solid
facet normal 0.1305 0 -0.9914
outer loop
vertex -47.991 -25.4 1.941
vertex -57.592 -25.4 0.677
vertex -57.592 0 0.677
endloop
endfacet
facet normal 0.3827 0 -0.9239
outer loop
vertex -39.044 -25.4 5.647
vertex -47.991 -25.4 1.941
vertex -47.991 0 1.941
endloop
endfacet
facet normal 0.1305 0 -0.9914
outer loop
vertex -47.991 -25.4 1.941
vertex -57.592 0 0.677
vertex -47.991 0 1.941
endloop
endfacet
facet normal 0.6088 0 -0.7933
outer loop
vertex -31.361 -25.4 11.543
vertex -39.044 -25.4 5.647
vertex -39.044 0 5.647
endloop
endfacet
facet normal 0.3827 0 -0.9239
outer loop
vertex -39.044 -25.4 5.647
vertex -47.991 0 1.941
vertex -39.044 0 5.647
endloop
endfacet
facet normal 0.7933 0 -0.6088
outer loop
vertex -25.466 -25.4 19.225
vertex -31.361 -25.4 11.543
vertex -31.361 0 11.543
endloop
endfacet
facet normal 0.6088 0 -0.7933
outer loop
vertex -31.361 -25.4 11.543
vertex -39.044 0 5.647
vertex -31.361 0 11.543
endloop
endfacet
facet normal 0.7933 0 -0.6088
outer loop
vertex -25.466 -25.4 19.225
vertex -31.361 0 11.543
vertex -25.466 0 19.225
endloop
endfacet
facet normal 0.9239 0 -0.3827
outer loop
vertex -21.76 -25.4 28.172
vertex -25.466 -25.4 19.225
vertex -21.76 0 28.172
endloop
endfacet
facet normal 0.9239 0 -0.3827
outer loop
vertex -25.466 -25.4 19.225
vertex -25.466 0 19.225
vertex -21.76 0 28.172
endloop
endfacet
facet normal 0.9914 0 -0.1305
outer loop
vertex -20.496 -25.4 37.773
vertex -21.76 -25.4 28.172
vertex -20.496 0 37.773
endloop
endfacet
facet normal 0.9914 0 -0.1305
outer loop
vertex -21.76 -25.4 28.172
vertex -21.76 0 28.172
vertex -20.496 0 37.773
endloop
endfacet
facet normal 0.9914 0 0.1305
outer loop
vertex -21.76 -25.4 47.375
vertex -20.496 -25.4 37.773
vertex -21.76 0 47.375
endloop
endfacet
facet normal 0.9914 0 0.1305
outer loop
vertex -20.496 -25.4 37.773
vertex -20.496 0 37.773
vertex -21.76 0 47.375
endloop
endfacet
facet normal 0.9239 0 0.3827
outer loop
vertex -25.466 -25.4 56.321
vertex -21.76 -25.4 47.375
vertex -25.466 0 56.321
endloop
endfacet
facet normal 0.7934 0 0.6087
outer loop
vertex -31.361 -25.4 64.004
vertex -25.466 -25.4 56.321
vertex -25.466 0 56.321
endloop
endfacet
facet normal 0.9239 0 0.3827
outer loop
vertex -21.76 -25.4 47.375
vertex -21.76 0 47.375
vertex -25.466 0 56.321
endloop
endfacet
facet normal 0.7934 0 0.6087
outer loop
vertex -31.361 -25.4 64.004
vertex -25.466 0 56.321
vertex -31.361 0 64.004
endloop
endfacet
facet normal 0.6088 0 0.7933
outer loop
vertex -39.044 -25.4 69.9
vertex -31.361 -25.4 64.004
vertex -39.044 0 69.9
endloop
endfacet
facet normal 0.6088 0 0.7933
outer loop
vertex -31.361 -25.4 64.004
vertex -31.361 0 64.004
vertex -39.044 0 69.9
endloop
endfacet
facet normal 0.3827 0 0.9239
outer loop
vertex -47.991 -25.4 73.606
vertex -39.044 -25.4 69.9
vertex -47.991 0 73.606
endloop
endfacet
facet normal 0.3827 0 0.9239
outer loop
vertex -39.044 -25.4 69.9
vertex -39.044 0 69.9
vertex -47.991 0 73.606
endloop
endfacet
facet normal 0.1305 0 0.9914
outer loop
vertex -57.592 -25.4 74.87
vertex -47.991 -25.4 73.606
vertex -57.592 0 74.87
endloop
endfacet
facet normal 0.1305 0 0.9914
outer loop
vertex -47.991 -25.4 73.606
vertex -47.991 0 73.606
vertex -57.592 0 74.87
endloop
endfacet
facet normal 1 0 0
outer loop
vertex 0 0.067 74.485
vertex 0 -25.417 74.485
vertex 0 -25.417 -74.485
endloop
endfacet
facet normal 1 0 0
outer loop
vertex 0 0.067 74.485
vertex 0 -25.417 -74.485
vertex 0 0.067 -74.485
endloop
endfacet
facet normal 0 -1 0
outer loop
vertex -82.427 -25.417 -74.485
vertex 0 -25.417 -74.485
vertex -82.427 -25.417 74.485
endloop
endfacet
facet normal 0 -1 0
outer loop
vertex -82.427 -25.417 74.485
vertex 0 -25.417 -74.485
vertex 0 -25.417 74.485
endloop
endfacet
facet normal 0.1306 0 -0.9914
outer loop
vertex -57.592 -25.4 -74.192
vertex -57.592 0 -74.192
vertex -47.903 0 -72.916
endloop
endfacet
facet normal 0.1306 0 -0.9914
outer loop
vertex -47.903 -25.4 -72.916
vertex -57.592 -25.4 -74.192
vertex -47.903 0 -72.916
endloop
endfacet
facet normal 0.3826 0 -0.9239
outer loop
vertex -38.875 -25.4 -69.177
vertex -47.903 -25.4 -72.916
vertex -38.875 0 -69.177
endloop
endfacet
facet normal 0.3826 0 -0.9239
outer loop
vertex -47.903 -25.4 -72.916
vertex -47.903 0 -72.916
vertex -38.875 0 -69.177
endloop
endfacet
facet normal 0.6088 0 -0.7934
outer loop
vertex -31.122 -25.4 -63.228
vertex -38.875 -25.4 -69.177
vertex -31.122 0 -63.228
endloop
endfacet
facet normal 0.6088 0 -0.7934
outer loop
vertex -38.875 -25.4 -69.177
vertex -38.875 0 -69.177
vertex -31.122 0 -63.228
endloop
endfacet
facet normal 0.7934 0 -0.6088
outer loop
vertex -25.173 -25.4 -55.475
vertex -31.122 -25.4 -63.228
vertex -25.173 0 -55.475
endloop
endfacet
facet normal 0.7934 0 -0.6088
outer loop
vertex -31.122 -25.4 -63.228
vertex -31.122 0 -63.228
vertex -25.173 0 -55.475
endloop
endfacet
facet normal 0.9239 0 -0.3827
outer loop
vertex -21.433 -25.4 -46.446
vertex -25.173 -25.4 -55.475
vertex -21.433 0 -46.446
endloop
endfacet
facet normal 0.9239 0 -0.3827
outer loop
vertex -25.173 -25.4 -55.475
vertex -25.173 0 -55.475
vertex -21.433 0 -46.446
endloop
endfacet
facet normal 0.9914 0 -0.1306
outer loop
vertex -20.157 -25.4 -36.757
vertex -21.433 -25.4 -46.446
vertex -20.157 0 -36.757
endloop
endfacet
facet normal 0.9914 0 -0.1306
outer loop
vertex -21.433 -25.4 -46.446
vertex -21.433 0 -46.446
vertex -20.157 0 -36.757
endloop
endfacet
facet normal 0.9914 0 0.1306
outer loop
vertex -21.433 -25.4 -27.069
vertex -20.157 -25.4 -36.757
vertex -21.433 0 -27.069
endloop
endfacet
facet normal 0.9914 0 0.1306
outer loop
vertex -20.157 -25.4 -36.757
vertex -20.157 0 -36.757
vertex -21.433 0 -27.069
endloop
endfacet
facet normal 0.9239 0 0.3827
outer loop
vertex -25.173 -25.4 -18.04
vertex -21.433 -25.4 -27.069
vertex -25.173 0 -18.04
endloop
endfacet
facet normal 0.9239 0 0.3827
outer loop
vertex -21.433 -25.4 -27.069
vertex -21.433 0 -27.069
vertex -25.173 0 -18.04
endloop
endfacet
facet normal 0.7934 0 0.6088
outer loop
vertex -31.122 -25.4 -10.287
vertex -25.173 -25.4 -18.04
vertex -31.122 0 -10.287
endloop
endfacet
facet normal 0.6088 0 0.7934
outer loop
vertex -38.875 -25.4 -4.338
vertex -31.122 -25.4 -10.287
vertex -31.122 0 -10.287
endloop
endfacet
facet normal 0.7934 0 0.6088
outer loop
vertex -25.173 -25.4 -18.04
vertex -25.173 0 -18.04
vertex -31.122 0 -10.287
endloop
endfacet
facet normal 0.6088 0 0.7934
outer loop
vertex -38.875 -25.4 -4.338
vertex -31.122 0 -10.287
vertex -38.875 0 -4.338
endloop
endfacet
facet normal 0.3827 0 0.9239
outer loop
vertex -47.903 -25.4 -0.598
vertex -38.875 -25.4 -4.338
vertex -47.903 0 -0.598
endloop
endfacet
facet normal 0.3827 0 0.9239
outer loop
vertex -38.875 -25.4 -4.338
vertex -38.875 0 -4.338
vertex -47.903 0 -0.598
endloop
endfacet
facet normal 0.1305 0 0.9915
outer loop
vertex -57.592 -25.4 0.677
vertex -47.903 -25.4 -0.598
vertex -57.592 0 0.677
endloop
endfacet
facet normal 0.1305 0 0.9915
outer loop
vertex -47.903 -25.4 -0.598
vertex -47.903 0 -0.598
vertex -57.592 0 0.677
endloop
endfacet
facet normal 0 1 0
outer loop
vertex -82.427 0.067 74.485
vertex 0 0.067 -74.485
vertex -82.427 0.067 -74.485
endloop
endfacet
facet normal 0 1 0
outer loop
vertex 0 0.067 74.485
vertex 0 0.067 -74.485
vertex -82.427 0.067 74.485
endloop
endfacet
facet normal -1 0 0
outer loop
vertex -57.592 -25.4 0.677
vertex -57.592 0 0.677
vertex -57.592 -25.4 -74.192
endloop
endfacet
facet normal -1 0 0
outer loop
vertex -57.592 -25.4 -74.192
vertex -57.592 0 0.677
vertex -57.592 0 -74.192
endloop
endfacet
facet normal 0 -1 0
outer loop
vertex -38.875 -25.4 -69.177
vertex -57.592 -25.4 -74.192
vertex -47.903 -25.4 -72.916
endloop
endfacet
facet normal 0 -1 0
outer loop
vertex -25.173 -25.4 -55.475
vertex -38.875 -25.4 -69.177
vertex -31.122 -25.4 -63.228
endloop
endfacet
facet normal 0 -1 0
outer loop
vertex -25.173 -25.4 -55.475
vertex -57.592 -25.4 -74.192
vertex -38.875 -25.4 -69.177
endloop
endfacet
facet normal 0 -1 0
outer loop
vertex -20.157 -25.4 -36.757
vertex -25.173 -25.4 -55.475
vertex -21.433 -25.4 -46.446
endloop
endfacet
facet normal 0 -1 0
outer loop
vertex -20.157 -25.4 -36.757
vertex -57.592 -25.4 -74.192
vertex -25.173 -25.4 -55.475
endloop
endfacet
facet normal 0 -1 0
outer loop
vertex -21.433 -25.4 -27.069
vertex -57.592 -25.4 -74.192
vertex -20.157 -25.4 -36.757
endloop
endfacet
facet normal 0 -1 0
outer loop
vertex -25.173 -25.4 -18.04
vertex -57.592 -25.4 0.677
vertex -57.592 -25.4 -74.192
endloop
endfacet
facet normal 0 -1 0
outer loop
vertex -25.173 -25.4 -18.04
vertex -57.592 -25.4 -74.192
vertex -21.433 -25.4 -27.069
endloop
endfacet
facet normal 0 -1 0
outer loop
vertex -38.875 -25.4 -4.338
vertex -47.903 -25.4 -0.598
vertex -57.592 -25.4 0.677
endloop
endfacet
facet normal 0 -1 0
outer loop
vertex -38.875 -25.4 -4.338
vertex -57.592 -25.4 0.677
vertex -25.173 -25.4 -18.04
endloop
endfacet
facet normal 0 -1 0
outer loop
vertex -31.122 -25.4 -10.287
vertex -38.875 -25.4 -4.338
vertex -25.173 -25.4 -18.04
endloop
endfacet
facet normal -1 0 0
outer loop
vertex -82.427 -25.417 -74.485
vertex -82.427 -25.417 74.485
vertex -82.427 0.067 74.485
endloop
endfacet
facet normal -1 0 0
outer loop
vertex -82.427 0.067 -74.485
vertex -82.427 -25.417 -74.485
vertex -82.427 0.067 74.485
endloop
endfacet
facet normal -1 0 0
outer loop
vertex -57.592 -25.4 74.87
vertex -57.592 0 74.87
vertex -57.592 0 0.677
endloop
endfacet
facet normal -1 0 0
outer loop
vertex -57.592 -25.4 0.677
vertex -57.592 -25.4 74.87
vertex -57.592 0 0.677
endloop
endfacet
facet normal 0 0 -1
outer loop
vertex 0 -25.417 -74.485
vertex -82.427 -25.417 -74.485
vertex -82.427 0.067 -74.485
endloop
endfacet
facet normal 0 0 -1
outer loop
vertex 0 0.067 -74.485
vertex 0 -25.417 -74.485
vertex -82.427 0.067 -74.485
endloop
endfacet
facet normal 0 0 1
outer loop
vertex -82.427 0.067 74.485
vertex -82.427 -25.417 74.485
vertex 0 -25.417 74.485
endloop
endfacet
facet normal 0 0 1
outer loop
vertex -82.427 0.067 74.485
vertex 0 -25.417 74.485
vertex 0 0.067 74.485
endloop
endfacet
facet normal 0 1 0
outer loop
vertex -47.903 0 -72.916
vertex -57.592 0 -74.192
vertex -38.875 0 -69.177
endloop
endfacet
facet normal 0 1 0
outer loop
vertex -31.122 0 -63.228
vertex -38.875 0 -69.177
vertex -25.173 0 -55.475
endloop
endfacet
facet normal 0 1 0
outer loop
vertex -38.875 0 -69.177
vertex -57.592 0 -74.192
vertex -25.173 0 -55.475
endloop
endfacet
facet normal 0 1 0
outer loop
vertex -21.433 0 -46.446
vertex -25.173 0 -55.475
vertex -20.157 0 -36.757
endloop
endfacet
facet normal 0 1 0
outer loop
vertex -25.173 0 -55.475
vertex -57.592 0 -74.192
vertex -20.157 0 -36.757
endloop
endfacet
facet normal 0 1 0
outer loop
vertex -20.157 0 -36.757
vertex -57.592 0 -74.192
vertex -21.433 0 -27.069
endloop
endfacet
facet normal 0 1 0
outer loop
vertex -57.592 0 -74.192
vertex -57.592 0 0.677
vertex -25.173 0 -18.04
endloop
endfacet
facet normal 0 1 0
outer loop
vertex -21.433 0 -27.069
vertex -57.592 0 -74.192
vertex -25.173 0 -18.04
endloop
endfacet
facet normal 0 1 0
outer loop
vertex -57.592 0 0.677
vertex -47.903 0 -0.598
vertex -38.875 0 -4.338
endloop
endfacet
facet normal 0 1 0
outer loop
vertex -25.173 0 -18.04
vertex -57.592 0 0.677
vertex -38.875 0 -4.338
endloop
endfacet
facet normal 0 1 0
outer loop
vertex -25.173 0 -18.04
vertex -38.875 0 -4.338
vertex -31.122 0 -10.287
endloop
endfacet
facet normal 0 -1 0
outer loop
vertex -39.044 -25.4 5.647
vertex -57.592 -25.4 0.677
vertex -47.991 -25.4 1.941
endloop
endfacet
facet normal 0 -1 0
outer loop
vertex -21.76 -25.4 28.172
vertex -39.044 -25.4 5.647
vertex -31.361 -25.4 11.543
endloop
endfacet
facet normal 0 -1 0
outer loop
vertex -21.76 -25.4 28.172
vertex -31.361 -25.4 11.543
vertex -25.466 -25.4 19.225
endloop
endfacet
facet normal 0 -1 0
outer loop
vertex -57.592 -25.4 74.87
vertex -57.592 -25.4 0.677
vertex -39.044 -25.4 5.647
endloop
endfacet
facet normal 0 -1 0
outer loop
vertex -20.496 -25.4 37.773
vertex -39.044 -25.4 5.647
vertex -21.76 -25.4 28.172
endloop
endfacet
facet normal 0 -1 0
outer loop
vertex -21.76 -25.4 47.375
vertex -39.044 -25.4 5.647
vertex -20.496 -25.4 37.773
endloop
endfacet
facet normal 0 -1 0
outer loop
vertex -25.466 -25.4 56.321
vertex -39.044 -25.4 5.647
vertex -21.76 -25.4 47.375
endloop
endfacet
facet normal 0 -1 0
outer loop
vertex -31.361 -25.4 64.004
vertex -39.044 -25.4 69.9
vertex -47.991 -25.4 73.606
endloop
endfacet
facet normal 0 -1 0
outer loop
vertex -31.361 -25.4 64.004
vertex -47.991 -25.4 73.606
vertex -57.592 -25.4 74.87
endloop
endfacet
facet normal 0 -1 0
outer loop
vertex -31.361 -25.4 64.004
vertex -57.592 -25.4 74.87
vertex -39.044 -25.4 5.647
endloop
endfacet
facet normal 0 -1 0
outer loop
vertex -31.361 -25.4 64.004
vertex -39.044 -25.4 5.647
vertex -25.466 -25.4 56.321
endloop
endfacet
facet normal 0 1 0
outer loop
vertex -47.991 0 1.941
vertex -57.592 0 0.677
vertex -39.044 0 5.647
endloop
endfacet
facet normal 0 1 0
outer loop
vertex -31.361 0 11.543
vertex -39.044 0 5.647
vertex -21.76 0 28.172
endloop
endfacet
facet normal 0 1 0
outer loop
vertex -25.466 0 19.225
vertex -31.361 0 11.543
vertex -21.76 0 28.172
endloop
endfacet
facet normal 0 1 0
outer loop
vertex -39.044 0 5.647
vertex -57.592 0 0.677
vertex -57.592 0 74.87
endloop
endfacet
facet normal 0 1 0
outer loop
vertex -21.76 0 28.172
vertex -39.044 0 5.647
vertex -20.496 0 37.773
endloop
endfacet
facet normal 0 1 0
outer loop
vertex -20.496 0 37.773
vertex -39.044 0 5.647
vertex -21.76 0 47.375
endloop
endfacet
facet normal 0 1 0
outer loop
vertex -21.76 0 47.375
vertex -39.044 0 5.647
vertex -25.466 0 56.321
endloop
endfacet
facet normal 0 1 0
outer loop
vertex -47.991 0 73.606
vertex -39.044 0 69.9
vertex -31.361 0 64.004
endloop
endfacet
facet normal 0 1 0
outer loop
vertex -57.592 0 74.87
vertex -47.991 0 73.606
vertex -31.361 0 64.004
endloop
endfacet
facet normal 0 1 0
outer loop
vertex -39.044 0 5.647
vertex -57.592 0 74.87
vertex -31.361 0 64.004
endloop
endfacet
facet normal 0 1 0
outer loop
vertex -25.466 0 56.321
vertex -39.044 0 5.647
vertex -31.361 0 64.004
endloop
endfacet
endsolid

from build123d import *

# Parameters (mm, degrees)
F1_DEPTH = 25.4
F2_W     = 25.4842
F2_H     = 148.970514
F3_DEPTH = 82.426809


with BuildPart() as f1:
    # F0 (on Front) → F1 (new body)
    with BuildSketch(Plane.XZ):
        with BuildLine():
            Line((-57.591952, 74.869528), (-57.591952, 0.677362))
            ThreePointArc((-57.591952, 0.677362), (-20.495869, 37.773445), (-57.591952, 74.869528))
        make_face()
        with BuildLine():
            Line((-57.591952, 0.677362), (-57.591952, -74.191973))
            ThreePointArc((-57.591952, -74.191973), (-20.157285, -36.757305), (-57.591952, 0.677362))
        make_face()
    extrude(amount=F1_DEPTH)


with BuildPart() as f3:
    # F2 (on Right) → F3 (new body)
    with BuildSketch(Plane.YZ):
        with Locations((-12.675086, 0)):
            Rectangle(F2_W, F2_H)
    extrude(amount=-F3_DEPTH)


solid = Compound([f1.part, f3.part])
